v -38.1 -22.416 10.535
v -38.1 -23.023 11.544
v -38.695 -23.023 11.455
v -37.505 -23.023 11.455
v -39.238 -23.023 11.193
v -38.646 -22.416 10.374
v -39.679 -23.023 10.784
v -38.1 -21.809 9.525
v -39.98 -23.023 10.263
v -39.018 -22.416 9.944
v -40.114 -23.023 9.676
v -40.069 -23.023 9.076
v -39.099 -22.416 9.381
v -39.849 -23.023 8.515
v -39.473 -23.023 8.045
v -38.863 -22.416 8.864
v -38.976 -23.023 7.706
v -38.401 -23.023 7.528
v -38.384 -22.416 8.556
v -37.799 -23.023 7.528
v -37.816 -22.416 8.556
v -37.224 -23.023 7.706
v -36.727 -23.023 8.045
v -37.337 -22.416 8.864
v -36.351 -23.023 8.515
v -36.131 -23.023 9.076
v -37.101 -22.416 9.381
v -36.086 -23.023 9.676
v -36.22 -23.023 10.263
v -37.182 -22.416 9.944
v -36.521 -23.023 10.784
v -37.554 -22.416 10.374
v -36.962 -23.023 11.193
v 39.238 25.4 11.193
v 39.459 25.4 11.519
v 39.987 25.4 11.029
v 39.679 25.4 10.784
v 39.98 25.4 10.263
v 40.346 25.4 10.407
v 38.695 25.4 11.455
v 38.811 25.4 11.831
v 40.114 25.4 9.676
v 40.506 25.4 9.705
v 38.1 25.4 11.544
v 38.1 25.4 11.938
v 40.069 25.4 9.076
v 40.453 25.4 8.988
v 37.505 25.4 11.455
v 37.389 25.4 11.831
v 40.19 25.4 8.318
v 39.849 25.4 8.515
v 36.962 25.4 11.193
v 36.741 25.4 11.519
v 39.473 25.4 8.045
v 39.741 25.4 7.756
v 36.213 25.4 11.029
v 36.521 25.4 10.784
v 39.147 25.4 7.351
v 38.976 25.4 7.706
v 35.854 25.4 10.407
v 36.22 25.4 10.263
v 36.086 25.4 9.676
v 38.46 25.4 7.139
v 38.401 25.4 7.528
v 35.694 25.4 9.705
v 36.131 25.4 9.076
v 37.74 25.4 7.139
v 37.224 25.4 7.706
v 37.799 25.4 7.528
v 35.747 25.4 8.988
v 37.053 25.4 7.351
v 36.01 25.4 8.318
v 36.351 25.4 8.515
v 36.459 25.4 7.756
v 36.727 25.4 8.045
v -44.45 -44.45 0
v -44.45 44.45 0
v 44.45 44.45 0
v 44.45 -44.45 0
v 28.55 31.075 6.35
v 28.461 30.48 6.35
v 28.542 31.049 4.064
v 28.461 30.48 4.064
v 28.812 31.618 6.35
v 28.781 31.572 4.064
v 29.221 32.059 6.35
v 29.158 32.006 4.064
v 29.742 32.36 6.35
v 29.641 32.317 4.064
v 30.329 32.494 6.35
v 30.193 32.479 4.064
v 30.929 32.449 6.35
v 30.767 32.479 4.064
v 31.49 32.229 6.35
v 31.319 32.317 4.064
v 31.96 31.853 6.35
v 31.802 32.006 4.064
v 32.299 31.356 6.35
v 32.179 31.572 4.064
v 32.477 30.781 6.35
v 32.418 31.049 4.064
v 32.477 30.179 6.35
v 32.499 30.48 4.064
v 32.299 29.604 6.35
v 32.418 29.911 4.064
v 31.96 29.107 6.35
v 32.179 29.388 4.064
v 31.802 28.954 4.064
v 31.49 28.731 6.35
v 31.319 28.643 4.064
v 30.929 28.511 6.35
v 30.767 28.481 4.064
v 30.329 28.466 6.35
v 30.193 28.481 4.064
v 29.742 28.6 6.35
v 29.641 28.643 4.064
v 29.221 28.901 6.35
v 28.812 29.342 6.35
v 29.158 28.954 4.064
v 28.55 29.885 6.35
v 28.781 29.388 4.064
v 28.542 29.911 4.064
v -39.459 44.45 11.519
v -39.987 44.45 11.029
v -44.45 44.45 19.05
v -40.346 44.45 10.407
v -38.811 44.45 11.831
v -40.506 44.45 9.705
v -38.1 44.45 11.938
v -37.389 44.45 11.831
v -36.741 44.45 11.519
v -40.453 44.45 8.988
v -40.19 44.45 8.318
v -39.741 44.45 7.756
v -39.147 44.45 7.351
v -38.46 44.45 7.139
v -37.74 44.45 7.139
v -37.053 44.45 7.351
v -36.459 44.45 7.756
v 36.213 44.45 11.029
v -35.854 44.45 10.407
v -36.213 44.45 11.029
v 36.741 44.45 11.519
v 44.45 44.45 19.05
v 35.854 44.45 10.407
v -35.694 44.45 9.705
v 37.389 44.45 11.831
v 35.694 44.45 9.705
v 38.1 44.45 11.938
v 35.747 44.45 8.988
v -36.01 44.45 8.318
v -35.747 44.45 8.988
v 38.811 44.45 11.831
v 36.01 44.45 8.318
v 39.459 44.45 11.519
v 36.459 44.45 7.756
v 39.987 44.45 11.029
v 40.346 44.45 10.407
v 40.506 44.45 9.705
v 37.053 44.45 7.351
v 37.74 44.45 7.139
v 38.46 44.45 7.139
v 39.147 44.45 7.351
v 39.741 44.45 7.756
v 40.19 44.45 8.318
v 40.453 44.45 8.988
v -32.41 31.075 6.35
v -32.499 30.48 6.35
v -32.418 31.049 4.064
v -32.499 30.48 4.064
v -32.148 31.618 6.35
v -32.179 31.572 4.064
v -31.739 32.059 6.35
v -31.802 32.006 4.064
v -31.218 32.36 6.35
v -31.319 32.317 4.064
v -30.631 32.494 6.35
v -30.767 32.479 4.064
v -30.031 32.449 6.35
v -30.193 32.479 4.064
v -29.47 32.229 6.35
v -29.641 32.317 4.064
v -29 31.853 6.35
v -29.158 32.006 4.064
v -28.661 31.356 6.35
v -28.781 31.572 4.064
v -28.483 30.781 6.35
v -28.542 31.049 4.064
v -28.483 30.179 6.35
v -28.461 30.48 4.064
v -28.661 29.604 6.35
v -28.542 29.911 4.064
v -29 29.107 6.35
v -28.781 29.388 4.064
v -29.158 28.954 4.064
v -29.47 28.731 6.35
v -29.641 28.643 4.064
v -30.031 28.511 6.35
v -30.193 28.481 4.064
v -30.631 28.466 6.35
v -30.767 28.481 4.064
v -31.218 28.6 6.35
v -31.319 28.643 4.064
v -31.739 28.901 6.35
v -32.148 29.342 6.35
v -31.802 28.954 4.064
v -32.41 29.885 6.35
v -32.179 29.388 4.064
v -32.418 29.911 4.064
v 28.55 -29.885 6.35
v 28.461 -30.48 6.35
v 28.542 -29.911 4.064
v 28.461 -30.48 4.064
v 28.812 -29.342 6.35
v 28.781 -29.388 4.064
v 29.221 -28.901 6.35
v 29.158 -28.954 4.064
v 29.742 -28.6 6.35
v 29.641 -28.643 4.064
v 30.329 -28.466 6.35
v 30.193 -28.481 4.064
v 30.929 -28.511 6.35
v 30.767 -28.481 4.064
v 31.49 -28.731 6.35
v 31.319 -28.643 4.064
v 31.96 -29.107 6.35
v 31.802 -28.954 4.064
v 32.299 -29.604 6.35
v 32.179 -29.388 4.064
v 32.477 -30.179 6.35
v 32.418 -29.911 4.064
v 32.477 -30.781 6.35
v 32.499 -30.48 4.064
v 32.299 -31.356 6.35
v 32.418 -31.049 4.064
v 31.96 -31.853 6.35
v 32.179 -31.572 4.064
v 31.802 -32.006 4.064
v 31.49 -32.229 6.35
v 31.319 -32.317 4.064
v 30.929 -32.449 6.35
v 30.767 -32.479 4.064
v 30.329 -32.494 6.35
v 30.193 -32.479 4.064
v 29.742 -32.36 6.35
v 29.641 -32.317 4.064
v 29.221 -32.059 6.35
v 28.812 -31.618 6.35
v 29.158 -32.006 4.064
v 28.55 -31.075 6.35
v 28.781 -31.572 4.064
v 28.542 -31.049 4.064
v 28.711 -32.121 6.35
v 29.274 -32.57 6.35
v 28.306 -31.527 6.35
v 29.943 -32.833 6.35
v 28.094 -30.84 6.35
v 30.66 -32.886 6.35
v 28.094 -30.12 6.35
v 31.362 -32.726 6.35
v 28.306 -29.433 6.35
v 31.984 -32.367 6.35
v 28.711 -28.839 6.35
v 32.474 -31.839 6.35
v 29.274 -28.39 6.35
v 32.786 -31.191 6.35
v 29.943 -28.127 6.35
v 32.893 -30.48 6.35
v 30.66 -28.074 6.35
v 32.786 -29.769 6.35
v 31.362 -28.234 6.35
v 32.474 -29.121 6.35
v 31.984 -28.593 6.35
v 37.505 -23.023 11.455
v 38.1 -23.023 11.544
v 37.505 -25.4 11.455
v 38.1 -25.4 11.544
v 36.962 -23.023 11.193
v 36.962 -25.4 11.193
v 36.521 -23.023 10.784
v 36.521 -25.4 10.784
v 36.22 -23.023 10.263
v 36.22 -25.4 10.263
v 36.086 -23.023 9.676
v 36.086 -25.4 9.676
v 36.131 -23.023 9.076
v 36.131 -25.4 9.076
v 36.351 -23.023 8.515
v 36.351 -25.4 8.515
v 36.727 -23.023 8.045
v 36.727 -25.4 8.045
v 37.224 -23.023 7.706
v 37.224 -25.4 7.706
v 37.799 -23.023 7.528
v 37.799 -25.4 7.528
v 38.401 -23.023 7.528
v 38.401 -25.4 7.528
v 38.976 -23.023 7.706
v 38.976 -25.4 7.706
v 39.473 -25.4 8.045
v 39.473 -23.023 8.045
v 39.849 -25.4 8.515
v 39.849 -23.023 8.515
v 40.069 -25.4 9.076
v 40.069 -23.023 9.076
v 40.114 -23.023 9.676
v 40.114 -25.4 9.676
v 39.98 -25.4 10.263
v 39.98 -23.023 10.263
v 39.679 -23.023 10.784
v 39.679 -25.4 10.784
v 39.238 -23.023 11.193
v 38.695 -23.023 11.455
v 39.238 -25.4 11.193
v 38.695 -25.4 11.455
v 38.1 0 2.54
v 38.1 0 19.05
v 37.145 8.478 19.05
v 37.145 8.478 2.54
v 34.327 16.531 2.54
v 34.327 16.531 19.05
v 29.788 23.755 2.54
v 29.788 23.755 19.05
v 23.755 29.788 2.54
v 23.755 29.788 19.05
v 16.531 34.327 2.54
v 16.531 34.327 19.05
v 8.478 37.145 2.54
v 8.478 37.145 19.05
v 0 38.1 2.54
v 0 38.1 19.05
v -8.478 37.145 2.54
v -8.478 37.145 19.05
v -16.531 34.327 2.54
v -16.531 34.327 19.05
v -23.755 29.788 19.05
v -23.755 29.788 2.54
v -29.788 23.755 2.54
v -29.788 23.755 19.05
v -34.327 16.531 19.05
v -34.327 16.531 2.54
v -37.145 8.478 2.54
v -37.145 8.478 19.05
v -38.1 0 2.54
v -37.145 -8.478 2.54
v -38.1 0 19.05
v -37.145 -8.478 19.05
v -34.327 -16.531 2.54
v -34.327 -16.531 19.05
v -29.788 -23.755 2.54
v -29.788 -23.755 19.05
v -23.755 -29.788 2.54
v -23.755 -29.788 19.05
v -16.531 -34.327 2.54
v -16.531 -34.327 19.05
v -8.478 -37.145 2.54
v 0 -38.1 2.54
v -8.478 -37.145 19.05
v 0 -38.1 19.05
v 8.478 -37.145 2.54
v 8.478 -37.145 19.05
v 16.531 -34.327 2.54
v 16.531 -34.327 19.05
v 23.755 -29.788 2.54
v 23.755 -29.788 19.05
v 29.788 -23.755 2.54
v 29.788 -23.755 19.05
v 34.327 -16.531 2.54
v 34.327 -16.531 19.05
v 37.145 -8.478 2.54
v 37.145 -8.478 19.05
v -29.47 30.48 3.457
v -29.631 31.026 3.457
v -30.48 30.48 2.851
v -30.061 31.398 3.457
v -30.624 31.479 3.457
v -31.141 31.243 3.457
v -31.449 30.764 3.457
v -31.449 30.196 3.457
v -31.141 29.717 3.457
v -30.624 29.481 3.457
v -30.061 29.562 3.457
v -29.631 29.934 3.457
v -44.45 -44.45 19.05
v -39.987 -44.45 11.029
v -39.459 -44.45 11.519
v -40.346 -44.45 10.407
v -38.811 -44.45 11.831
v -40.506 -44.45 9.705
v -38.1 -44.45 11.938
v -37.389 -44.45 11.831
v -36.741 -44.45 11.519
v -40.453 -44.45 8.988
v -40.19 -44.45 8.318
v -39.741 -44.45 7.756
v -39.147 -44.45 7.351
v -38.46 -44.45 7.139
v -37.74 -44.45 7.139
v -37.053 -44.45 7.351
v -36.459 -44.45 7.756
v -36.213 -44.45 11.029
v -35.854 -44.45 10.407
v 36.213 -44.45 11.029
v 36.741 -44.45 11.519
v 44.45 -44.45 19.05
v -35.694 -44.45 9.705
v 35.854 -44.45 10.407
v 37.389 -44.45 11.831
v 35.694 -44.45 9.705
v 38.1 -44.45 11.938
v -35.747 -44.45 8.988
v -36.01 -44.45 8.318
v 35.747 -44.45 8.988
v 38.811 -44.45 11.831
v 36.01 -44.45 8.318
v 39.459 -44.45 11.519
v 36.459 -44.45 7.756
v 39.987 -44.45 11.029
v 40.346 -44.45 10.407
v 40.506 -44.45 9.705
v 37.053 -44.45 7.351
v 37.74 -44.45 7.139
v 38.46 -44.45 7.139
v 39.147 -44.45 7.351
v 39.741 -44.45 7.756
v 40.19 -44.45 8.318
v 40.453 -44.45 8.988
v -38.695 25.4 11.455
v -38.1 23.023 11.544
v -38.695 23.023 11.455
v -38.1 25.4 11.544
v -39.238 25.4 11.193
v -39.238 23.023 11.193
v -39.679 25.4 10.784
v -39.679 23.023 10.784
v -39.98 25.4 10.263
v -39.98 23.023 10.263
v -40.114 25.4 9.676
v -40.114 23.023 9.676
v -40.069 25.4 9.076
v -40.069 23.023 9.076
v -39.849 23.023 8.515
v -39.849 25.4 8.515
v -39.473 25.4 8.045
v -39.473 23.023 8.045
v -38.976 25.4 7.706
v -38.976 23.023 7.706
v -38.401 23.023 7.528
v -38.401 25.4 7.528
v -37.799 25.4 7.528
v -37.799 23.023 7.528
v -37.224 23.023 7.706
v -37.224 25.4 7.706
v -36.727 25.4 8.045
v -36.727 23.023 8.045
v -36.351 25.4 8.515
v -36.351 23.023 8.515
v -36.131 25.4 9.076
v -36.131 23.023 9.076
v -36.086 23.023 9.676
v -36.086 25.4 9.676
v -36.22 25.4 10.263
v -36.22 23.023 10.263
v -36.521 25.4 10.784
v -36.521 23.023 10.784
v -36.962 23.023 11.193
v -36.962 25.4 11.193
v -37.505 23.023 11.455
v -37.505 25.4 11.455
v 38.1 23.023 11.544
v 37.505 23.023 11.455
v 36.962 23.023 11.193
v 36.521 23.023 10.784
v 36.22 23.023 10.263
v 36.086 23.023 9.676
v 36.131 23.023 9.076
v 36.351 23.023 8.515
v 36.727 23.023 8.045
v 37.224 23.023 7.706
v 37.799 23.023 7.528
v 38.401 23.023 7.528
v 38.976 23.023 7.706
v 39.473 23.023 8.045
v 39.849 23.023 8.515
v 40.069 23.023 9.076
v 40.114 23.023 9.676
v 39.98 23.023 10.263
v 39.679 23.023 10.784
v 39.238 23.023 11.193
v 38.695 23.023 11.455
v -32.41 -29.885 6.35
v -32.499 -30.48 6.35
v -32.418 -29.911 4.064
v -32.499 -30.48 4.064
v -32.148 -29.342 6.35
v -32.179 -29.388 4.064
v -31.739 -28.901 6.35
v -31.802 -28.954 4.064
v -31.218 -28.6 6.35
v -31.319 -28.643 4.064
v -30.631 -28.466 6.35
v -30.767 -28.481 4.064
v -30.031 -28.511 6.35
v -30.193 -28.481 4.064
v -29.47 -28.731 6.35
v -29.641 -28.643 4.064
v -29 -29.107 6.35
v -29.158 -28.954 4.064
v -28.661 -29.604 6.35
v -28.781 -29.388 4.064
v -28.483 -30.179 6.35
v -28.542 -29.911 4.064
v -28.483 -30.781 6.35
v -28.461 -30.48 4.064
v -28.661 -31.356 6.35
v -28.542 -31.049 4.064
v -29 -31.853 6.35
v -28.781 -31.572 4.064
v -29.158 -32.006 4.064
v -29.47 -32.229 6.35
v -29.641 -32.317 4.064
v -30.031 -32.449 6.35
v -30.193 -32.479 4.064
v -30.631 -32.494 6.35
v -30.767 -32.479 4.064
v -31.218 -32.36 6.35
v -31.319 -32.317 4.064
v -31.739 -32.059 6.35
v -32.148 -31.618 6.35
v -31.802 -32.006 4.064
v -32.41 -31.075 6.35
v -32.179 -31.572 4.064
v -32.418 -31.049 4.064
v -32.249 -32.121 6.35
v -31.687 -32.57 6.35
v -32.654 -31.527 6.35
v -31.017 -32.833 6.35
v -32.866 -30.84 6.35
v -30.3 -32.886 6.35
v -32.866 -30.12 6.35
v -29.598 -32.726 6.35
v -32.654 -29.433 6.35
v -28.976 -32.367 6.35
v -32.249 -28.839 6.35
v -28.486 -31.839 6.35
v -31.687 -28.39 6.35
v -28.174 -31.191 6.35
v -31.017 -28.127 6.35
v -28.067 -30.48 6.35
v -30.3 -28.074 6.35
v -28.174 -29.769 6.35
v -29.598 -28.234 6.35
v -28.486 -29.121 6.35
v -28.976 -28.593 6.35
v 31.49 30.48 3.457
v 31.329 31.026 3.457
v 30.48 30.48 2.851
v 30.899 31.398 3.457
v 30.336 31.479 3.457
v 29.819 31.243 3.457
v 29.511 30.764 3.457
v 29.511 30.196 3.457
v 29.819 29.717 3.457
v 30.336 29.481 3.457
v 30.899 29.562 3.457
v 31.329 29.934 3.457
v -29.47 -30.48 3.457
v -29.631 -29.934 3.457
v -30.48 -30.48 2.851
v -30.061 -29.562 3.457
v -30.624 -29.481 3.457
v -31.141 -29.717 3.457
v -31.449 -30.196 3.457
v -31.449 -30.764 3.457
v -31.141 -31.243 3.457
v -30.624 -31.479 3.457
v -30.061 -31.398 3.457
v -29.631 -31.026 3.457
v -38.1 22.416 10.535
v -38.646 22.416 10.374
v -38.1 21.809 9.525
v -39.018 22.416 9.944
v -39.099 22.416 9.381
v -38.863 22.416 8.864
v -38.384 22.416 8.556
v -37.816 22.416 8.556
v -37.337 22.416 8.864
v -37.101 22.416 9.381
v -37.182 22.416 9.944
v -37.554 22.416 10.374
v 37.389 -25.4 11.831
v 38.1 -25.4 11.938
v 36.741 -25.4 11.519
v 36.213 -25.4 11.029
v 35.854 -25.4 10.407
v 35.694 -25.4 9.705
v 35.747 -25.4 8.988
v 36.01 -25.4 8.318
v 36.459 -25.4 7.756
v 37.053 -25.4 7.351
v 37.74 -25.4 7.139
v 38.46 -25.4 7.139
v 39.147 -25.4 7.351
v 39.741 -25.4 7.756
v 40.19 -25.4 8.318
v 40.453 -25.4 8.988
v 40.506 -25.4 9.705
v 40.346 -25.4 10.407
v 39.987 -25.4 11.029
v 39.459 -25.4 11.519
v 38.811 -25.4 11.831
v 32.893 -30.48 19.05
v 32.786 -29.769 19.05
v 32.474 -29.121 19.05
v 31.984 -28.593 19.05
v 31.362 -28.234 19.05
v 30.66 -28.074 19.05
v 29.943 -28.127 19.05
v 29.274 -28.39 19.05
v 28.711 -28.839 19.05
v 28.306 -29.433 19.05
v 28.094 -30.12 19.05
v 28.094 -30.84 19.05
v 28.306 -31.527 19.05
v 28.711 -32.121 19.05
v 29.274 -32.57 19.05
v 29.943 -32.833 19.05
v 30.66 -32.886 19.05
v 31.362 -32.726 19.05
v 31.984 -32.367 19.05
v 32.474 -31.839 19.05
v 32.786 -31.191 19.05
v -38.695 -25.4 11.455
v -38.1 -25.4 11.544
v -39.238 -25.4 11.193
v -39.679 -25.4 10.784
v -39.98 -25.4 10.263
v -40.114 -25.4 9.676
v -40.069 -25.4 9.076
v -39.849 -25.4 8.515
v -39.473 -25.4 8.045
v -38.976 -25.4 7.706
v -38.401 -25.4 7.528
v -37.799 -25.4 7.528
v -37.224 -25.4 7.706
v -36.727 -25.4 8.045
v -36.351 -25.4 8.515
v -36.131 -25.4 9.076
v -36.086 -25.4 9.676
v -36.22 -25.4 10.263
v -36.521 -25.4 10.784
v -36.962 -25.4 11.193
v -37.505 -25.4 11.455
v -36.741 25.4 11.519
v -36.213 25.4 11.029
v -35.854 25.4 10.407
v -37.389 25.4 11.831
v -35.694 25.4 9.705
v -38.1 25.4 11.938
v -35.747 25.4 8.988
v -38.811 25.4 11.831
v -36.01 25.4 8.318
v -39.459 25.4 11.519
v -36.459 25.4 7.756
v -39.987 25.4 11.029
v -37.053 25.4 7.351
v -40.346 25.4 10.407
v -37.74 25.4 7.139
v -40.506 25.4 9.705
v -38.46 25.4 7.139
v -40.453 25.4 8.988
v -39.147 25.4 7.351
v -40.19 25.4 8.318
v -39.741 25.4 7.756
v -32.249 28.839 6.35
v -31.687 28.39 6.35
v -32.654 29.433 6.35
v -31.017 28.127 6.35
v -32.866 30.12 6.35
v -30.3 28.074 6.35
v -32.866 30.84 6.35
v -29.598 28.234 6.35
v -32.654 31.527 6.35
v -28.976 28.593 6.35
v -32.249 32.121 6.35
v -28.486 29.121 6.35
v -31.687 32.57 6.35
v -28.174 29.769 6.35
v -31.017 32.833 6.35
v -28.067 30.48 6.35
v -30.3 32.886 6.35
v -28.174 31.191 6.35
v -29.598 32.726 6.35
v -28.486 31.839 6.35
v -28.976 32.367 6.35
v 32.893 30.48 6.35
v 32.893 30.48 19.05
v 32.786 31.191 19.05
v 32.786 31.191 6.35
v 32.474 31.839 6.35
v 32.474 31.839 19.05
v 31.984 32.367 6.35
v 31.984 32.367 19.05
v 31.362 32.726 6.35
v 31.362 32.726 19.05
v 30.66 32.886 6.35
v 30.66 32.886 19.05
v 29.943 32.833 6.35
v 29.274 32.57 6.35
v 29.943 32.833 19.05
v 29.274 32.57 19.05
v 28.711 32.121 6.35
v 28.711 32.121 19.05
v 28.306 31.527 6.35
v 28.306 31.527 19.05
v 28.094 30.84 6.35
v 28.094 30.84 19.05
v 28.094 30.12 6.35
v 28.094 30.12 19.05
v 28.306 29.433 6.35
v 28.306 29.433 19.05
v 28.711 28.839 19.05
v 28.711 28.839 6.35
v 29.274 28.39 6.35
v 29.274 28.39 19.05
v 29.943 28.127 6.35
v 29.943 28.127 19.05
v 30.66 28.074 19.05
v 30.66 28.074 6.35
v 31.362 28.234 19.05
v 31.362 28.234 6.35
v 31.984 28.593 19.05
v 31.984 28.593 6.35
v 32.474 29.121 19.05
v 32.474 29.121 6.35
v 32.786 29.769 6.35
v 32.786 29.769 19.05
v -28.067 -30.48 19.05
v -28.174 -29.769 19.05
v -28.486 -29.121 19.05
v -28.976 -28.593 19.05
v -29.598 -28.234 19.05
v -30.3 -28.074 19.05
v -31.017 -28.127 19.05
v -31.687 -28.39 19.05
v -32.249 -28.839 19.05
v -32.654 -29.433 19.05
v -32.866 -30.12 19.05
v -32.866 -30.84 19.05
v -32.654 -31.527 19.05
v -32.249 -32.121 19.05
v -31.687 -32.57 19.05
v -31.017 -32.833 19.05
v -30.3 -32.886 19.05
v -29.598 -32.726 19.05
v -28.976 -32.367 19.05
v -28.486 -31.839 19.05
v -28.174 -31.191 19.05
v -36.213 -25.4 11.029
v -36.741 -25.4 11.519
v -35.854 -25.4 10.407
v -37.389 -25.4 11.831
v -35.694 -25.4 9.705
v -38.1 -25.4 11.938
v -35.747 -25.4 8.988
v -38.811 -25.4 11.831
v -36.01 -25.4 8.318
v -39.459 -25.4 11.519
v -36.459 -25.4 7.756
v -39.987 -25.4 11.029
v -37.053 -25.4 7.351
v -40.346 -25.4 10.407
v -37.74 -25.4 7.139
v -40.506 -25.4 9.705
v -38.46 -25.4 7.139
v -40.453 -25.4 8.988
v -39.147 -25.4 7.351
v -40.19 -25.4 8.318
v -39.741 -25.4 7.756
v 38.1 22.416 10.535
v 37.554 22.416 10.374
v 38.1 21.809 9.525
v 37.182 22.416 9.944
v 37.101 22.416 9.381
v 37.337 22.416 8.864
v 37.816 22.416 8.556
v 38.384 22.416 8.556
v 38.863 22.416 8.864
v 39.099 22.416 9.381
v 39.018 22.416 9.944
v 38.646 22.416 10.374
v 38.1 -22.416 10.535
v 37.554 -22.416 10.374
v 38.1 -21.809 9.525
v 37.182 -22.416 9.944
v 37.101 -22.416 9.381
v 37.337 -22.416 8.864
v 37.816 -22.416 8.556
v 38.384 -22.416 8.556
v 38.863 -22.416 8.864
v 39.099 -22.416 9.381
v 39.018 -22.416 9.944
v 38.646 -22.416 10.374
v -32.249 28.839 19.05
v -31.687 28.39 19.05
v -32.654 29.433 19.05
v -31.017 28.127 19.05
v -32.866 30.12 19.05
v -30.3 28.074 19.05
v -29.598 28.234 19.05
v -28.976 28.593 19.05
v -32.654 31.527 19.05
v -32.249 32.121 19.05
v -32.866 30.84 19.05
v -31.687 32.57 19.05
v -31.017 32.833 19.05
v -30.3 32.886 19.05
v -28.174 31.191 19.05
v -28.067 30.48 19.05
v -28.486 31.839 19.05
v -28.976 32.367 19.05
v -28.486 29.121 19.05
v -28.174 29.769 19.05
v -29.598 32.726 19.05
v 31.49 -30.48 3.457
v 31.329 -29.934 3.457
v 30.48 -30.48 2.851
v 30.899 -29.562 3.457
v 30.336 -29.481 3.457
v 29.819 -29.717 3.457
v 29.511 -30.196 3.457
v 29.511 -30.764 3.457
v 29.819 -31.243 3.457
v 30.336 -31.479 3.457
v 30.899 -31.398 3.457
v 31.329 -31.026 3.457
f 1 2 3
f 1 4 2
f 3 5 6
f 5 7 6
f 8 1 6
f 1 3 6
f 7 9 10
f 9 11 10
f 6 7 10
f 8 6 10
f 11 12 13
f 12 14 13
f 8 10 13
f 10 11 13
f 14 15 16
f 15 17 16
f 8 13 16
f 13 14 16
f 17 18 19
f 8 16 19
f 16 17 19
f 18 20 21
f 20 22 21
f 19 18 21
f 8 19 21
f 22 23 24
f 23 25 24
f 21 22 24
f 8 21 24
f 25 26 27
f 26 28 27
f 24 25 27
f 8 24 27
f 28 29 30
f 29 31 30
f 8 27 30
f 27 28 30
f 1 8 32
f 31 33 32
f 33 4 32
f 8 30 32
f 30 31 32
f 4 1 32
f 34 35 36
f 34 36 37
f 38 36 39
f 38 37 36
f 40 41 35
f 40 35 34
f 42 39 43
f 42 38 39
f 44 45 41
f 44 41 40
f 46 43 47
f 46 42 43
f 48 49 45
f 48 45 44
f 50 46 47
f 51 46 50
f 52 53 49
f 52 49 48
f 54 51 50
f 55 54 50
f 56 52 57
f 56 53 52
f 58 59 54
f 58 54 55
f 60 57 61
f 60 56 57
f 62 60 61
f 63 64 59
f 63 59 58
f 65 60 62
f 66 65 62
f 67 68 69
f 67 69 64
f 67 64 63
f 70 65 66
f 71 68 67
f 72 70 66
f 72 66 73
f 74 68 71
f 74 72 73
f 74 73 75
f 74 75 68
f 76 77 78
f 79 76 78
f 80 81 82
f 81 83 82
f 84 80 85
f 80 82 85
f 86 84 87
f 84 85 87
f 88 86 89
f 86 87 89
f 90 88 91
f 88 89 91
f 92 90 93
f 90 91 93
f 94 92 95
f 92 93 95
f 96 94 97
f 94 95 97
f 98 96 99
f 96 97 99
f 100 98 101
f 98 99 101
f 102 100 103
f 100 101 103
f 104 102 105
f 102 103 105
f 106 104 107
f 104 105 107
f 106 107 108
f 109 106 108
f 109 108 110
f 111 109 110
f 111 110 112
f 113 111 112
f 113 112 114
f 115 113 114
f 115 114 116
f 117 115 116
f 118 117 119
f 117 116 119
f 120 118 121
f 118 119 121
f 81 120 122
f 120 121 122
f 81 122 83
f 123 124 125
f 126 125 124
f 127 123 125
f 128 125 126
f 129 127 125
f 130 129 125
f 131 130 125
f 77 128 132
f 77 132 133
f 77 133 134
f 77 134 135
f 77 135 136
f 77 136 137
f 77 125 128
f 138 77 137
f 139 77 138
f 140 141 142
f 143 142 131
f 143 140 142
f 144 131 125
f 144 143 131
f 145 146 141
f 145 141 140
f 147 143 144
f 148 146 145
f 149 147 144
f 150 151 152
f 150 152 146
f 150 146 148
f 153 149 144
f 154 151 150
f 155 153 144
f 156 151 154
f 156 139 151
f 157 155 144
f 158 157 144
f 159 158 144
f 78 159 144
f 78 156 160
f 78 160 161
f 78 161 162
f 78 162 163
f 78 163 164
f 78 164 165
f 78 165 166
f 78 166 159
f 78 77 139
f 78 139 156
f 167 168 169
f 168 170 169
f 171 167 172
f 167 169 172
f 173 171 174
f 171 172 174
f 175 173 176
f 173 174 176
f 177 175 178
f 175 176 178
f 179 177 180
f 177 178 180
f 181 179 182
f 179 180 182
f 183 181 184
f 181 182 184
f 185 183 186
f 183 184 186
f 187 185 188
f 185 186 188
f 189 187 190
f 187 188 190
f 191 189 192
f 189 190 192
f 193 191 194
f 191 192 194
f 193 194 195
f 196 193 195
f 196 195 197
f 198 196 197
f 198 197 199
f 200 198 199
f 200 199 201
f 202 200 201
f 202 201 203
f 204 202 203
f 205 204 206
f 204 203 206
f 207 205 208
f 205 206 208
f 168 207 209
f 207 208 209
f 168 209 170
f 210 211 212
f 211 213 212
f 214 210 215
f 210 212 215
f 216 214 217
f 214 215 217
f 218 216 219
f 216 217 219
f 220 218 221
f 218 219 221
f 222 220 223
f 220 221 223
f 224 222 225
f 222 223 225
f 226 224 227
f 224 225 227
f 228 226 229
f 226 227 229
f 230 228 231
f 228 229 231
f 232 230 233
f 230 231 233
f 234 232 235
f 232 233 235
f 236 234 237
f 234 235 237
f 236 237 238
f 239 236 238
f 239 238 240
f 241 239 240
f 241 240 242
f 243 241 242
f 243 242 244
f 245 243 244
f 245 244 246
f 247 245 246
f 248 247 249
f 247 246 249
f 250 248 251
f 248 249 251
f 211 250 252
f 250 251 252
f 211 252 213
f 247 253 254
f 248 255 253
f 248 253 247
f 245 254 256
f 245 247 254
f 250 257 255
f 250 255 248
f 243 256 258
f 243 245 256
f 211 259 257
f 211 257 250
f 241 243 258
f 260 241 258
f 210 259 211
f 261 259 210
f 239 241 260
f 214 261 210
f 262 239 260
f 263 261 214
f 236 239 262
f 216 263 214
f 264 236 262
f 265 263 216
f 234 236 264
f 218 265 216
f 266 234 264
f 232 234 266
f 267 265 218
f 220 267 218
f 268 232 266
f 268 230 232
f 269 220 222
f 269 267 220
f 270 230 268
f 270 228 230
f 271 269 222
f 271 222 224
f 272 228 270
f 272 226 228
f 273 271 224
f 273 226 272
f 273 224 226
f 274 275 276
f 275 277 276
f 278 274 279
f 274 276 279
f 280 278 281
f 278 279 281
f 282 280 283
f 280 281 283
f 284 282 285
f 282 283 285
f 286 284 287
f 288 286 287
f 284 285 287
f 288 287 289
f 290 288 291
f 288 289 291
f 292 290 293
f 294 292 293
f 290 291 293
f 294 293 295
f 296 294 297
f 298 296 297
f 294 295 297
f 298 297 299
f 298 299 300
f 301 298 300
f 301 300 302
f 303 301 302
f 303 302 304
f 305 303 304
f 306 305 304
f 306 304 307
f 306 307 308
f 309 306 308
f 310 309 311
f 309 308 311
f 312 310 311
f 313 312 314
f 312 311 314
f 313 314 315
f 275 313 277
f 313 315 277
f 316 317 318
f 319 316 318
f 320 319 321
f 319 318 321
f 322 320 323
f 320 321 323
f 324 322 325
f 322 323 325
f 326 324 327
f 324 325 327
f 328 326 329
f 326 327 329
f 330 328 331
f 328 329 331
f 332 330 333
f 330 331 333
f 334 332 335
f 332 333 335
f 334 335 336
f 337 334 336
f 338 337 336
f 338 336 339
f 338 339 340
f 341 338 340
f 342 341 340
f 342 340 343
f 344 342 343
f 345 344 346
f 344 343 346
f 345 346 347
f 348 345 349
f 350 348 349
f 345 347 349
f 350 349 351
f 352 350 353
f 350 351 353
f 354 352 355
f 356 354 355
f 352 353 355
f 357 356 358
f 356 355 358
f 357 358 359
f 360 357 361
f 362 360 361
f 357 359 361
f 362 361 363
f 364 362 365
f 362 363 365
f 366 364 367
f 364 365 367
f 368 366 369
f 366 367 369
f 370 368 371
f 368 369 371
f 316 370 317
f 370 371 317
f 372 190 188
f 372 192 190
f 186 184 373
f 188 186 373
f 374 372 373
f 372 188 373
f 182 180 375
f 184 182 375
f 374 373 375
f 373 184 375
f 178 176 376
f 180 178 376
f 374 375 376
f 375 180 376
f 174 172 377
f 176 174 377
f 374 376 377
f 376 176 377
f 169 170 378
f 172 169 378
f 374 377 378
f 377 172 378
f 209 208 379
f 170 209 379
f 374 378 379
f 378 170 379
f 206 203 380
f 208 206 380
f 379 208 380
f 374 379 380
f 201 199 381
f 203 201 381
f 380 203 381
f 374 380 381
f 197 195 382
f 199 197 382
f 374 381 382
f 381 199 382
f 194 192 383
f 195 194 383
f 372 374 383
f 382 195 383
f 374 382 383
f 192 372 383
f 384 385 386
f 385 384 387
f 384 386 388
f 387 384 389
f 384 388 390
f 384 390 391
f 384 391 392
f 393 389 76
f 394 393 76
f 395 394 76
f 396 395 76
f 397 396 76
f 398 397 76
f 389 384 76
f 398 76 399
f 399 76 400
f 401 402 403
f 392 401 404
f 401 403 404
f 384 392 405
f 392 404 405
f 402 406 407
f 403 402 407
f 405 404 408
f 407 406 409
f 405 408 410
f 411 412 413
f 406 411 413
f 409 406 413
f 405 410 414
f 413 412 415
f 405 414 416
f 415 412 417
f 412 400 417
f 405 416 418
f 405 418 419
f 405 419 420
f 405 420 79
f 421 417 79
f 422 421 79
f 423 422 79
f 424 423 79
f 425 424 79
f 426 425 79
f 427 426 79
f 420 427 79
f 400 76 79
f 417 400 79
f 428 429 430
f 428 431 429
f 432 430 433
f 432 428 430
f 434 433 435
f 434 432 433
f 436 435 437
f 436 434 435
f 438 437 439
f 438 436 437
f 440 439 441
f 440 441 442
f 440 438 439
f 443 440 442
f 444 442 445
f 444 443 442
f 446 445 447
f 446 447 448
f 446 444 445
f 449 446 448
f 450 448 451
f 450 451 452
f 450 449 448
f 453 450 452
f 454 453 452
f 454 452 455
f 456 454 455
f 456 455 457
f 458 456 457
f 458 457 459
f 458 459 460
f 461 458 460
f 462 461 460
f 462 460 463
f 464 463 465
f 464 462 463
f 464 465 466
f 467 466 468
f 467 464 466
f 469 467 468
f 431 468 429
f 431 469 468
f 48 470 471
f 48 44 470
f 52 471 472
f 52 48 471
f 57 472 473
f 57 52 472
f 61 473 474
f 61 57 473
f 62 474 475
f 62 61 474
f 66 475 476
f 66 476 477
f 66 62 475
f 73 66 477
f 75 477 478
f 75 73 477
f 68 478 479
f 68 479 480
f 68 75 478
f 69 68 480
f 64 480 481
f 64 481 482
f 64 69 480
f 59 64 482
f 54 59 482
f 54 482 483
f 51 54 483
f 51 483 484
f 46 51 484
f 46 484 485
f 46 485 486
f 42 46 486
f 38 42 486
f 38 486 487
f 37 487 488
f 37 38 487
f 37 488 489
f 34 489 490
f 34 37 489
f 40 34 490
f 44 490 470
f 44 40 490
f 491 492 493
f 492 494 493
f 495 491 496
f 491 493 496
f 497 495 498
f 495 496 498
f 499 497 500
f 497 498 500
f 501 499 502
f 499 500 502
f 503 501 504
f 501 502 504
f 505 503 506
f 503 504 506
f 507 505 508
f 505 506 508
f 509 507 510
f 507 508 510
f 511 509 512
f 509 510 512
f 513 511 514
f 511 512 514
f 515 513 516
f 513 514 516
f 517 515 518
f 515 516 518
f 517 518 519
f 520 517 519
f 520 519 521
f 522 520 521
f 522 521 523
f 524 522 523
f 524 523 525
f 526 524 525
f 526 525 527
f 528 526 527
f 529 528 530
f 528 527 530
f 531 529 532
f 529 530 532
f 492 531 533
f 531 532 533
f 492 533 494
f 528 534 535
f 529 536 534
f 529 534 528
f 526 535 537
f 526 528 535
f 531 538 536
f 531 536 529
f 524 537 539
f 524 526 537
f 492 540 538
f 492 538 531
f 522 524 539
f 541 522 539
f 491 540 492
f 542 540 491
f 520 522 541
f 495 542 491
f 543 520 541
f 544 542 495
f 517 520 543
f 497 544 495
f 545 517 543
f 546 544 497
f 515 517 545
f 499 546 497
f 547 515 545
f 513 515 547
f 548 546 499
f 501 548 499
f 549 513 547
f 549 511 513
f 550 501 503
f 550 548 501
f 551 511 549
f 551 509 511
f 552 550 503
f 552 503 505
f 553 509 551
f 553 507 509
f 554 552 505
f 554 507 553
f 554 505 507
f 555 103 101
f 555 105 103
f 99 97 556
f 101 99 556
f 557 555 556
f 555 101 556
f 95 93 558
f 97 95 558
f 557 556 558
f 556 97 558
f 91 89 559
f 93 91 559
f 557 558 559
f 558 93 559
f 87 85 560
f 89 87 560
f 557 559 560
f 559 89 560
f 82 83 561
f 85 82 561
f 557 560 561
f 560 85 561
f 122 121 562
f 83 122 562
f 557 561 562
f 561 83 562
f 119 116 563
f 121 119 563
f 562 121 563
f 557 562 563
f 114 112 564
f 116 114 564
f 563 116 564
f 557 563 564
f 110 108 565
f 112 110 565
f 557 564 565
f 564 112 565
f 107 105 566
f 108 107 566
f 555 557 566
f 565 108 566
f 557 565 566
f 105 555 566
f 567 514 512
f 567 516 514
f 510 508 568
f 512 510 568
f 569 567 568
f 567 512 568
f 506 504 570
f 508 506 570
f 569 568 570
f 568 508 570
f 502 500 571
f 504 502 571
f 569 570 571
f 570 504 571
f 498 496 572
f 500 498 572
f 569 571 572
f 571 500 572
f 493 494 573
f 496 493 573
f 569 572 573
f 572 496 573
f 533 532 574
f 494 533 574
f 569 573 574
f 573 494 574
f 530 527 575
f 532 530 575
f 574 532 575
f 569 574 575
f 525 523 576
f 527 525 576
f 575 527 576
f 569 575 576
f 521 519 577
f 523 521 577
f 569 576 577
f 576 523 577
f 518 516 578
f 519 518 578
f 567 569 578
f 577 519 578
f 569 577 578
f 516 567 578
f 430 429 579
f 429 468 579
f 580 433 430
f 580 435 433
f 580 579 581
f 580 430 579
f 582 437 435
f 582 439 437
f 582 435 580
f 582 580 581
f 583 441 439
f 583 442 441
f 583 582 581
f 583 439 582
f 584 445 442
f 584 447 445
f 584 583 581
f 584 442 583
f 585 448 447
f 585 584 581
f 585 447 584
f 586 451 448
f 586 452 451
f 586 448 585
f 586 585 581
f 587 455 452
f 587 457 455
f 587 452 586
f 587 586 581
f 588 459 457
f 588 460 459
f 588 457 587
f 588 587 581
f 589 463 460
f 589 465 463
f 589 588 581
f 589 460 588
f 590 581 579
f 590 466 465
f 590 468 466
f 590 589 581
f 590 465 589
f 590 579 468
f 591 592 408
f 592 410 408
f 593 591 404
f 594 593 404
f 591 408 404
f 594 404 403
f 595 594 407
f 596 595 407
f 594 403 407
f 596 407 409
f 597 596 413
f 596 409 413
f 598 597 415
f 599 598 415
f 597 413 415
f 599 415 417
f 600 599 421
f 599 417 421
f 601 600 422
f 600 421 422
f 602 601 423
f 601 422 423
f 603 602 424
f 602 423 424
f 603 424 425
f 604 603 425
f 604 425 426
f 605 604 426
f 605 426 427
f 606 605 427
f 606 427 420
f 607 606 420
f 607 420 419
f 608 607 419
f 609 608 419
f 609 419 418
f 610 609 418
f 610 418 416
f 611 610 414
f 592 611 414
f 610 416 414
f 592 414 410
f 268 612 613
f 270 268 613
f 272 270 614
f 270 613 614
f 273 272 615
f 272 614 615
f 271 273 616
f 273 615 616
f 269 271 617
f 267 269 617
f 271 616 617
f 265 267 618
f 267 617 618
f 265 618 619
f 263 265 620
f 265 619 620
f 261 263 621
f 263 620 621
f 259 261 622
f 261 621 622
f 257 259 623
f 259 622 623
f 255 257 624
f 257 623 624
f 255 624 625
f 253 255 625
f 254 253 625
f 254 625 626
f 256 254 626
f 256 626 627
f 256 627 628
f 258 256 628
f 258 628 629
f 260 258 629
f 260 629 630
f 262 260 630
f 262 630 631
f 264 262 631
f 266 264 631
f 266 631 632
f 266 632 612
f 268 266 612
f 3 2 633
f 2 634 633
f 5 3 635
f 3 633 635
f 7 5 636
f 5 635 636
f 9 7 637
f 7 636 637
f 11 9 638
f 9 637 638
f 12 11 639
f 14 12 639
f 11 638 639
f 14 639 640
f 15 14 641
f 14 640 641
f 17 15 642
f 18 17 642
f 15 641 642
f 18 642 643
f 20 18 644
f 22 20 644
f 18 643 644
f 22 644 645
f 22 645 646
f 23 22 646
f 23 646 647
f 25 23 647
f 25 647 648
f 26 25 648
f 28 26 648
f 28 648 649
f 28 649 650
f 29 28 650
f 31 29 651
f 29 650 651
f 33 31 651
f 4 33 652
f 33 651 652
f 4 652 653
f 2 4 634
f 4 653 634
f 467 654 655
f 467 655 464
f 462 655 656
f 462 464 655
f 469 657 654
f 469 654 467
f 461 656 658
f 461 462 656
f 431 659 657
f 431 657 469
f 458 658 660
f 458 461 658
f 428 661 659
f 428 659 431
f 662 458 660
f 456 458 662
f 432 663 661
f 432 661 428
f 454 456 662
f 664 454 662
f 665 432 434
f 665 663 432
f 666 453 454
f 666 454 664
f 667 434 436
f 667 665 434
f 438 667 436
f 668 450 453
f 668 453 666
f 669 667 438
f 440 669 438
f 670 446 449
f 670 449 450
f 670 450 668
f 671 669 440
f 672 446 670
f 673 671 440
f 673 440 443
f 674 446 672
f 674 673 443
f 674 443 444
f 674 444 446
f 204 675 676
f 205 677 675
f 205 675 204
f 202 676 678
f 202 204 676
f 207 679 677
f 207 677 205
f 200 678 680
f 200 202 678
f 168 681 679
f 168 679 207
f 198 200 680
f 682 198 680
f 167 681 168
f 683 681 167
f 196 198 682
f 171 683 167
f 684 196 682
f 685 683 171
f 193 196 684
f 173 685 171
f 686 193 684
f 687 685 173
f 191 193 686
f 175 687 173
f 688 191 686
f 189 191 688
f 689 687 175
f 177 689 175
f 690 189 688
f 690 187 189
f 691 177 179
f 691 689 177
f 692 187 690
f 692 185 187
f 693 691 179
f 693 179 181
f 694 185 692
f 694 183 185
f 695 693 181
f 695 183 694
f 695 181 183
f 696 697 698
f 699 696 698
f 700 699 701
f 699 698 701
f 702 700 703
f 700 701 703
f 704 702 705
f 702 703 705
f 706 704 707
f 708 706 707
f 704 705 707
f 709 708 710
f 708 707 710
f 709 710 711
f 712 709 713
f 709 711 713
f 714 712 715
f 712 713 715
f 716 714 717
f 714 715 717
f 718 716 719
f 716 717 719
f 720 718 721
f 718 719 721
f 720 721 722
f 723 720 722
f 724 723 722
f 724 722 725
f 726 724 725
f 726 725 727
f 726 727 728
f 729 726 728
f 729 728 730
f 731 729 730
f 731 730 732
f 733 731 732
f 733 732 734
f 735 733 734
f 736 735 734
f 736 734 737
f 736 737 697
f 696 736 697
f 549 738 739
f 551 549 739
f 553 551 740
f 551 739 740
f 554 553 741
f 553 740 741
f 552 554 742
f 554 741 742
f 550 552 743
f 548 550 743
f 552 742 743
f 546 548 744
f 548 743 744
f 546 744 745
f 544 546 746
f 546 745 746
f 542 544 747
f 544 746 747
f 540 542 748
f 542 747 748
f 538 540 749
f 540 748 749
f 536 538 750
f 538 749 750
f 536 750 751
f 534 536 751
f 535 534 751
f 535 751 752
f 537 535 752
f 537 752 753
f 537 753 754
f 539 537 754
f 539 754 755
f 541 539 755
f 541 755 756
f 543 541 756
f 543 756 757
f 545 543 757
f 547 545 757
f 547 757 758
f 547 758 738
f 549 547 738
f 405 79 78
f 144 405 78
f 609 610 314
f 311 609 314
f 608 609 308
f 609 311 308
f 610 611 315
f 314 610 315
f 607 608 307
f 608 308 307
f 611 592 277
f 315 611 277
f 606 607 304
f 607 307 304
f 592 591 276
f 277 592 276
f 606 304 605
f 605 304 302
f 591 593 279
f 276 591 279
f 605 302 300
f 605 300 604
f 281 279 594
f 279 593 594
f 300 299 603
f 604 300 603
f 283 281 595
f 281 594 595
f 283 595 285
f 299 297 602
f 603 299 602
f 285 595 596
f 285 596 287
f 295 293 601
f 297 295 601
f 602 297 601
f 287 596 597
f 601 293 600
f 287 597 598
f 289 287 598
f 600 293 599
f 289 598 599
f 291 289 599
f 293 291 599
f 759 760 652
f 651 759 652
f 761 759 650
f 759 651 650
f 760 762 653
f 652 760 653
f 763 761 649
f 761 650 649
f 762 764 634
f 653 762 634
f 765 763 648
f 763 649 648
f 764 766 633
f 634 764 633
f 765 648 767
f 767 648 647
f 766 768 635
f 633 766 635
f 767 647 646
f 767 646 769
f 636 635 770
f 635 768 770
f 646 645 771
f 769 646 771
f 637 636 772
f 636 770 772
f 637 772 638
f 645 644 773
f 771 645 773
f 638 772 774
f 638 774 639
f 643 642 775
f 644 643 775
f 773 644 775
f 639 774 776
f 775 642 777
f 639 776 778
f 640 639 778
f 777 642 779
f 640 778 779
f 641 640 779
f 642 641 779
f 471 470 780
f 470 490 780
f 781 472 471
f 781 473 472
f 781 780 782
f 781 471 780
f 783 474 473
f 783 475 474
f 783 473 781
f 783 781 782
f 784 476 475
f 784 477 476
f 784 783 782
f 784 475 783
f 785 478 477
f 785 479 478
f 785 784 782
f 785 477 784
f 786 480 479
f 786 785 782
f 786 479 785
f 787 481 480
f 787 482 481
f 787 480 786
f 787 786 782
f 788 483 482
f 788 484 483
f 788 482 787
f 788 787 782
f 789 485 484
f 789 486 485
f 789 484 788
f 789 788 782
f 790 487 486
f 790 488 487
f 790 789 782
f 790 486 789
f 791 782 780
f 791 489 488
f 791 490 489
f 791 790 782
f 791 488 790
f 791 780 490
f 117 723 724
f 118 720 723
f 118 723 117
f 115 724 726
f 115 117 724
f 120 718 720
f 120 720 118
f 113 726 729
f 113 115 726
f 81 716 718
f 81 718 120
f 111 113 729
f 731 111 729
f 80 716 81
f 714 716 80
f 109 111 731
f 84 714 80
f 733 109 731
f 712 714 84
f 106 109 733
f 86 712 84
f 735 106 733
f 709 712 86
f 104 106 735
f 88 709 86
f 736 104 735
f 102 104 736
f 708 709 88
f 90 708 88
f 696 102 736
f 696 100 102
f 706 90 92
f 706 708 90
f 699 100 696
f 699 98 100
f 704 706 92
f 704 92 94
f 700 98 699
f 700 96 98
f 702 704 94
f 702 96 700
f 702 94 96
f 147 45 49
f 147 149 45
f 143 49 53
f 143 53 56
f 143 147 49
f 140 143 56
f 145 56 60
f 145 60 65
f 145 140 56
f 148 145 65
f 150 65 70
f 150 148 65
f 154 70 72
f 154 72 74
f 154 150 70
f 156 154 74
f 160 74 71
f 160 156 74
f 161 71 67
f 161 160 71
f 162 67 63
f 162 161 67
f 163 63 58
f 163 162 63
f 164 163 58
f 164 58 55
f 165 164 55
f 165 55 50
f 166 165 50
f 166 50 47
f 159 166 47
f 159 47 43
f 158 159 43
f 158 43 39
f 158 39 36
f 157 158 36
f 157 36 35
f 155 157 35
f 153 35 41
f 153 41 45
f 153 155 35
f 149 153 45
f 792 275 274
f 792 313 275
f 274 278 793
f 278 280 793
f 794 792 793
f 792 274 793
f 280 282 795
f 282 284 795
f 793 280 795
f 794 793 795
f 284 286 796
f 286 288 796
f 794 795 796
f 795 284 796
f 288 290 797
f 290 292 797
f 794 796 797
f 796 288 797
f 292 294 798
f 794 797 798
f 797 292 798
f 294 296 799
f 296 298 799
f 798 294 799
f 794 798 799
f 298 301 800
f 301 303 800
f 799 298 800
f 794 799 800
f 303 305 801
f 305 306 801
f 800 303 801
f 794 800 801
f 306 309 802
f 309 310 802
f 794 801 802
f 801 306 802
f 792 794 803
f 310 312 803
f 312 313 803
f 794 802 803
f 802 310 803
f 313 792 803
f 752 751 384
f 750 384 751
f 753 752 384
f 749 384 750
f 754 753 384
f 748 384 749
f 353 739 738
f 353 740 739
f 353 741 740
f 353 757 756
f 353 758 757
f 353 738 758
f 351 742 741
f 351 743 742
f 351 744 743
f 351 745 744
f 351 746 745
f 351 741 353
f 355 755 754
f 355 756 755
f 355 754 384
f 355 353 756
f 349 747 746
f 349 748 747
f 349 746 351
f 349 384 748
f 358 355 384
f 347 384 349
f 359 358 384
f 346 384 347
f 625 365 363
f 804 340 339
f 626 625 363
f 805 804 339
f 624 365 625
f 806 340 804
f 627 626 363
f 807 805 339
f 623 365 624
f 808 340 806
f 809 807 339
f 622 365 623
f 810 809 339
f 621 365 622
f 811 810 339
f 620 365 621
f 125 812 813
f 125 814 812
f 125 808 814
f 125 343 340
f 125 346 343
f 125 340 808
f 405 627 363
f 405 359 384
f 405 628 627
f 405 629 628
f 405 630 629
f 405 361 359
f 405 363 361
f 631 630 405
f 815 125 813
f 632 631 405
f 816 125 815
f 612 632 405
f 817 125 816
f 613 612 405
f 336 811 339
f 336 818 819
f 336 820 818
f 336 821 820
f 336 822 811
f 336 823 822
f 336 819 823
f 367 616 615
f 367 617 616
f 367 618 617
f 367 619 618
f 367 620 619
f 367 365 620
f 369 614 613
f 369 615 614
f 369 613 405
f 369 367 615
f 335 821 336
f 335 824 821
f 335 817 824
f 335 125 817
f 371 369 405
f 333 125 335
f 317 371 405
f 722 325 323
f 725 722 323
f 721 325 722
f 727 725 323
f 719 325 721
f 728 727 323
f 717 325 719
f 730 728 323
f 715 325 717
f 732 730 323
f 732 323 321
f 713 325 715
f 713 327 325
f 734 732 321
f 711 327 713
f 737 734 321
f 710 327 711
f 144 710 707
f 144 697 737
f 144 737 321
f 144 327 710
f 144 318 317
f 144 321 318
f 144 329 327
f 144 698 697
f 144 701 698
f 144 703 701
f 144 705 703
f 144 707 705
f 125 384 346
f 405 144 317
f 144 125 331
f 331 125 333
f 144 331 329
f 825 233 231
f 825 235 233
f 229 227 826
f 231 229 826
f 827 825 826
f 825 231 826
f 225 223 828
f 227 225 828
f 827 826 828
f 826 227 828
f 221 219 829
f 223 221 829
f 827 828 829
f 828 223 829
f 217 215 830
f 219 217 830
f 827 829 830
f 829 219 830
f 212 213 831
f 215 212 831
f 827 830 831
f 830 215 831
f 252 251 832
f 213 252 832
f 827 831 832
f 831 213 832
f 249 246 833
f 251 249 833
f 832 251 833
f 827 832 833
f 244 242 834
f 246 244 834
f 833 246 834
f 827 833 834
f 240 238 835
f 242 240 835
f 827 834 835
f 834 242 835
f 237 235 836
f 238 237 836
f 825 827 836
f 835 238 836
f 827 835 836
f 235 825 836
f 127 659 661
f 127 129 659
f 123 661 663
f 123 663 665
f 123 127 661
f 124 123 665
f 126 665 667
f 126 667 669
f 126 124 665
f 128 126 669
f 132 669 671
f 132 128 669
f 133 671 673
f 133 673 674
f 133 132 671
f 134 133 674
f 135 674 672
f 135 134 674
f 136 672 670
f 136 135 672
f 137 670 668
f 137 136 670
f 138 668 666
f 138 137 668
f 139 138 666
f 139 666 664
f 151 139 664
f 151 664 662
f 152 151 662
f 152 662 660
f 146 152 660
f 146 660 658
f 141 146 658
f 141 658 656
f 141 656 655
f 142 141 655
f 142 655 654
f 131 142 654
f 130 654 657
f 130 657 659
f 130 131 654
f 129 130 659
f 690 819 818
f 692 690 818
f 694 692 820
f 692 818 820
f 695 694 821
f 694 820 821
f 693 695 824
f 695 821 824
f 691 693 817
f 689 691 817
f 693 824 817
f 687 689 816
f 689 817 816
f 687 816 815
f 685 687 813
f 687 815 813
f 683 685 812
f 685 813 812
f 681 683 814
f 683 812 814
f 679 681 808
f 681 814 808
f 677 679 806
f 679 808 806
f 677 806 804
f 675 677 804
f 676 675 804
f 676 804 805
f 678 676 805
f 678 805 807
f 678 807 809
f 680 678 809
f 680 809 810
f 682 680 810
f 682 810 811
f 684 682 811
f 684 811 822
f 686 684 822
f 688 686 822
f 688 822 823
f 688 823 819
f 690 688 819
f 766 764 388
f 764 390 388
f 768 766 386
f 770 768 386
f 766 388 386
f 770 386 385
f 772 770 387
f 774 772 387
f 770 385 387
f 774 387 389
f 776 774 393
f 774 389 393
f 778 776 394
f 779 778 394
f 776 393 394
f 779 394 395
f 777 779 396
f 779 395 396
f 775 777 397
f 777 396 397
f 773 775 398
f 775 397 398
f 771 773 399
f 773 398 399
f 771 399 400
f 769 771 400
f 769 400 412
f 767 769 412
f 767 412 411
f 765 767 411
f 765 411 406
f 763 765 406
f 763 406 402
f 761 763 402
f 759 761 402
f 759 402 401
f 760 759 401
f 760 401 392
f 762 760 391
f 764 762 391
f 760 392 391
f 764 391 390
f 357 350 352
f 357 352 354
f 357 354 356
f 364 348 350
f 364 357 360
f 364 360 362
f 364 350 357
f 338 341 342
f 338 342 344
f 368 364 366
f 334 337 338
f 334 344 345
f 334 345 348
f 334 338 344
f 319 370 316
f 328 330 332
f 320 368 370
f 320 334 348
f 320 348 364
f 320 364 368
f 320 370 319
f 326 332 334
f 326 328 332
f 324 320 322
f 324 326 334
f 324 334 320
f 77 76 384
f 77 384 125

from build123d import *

# Parameters (mm, degrees)
SKETCH1_W                        = 88.9
SKETCH1_H                        = 88.9
BOSS_EXTRUDE1_DEPTH              = 19.05
SKETCH2_R                        = 38.1
CUT_EXTRUDE1_DEPTH               = 16.51
F_10_32_TAPPED_HOLE1_AT_2_COUNT  = 2
F_10_32_TAPPED_HOLE1_AT_2_PITCH  = 76.2
F_10_32_TAPPED_HOLE2_D           = 4.0386
F_10_32_TAPPED_HOLE2_DEPTH       = 14.986
F_10_32_TAPPED_HOLE2_CBORE_D     = 4.826
F_10_32_TAPPED_HOLE2_CBORE_DEPTH = 12.7
F_10_32_TAPPED_HOLE2_TIP         = 1.213317848


with BuildPart() as part:
    # Sketch1 → Boss-Extrude1 (new body)
    with BuildSketch(Plane.XY):
        Rectangle(SKETCH1_W, SKETCH1_H)
    extrude(amount=BOSS_EXTRUDE1_DEPTH)

    # Sketch2 → Cut-Extrude1 (cut)
    with BuildSketch(Plane.XY.offset(19.05)):
        Circle(SKETCH2_R)
    extrude(amount=-CUT_EXTRUDE1_DEPTH, mode=Mode.SUBTRACT)

    # Sketch3 → #10-32 Tapped Hole1 (revolve, cut)
    with BuildSketch(Plane(origin=(-38.1, 44.45, 9.525), x_dir=(0, 0, 1), z_dir=(1, 0, 0))):
        Polygon((0, 0), (0, 22.640757848), (2.0193, 21.42744), (2.0193, 19.05), (2.413, 19.05), (2.413, 0), align=None)
    f_10_32_tapped_hole1 = revolve(axis=Axis((-38.1, 50.8, 9.525), (0, -1, 0)), mode=Mode.SUBTRACT)

    # #10-32 Tapped Hole1 at 2: #10-32 Tapped Hole1 ×2
    with Locations(*[(i * F_10_32_TAPPED_HOLE1_AT_2_PITCH, 0, 0) for i in range(1, F_10_32_TAPPED_HOLE1_AT_2_COUNT)]):
        add(f_10_32_tapped_hole1, mode=Mode.SUBTRACT)

    # Mirror1: #10-32 Tapped Hole1 across plane
    add(f_10_32_tapped_hole1.mirror(Plane.ZX), mode=Mode.SUBTRACT)

    # Mirror1 copy 1 sketch → Mirror1 copy 1 (revolve, cut)
    with BuildSketch(Plane(origin=(38.1, -44.45, 9.525), x_dir=(0, 0, 1), z_dir=(1, 0, 0))):
        Polygon((0, 0), (0, -22.640757848), (2.0193, -21.42744), (2.0193, -19.05), (2.413, -19.05), (2.413, 0), align=None)
    revolve(axis=Axis((38.1, -50.8, 9.525), (0, -1, 0)), mode=Mode.SUBTRACT)

    # #10-32 Tapped Hole2
    with Locations(Plane.XY.offset(19.05)):
        with Locations((30.48, -30.48), (-30.48, -30.48), (-30.48, 30.48), (30.48, 30.48)):
            CounterBoreHole(F_10_32_TAPPED_HOLE2_D / 2, F_10_32_TAPPED_HOLE2_CBORE_D / 2, F_10_32_TAPPED_HOLE2_CBORE_DEPTH, depth=F_10_32_TAPPED_HOLE2_DEPTH)
            with Locations((0, 0, -(F_10_32_TAPPED_HOLE2_DEPTH + F_10_32_TAPPED_HOLE2_TIP / 2))):  # 118° drill point
                Cone(0, F_10_32_TAPPED_HOLE2_D / 2, F_10_32_TAPPED_HOLE2_TIP, mode=Mode.SUBTRACT)


solid = part.part
